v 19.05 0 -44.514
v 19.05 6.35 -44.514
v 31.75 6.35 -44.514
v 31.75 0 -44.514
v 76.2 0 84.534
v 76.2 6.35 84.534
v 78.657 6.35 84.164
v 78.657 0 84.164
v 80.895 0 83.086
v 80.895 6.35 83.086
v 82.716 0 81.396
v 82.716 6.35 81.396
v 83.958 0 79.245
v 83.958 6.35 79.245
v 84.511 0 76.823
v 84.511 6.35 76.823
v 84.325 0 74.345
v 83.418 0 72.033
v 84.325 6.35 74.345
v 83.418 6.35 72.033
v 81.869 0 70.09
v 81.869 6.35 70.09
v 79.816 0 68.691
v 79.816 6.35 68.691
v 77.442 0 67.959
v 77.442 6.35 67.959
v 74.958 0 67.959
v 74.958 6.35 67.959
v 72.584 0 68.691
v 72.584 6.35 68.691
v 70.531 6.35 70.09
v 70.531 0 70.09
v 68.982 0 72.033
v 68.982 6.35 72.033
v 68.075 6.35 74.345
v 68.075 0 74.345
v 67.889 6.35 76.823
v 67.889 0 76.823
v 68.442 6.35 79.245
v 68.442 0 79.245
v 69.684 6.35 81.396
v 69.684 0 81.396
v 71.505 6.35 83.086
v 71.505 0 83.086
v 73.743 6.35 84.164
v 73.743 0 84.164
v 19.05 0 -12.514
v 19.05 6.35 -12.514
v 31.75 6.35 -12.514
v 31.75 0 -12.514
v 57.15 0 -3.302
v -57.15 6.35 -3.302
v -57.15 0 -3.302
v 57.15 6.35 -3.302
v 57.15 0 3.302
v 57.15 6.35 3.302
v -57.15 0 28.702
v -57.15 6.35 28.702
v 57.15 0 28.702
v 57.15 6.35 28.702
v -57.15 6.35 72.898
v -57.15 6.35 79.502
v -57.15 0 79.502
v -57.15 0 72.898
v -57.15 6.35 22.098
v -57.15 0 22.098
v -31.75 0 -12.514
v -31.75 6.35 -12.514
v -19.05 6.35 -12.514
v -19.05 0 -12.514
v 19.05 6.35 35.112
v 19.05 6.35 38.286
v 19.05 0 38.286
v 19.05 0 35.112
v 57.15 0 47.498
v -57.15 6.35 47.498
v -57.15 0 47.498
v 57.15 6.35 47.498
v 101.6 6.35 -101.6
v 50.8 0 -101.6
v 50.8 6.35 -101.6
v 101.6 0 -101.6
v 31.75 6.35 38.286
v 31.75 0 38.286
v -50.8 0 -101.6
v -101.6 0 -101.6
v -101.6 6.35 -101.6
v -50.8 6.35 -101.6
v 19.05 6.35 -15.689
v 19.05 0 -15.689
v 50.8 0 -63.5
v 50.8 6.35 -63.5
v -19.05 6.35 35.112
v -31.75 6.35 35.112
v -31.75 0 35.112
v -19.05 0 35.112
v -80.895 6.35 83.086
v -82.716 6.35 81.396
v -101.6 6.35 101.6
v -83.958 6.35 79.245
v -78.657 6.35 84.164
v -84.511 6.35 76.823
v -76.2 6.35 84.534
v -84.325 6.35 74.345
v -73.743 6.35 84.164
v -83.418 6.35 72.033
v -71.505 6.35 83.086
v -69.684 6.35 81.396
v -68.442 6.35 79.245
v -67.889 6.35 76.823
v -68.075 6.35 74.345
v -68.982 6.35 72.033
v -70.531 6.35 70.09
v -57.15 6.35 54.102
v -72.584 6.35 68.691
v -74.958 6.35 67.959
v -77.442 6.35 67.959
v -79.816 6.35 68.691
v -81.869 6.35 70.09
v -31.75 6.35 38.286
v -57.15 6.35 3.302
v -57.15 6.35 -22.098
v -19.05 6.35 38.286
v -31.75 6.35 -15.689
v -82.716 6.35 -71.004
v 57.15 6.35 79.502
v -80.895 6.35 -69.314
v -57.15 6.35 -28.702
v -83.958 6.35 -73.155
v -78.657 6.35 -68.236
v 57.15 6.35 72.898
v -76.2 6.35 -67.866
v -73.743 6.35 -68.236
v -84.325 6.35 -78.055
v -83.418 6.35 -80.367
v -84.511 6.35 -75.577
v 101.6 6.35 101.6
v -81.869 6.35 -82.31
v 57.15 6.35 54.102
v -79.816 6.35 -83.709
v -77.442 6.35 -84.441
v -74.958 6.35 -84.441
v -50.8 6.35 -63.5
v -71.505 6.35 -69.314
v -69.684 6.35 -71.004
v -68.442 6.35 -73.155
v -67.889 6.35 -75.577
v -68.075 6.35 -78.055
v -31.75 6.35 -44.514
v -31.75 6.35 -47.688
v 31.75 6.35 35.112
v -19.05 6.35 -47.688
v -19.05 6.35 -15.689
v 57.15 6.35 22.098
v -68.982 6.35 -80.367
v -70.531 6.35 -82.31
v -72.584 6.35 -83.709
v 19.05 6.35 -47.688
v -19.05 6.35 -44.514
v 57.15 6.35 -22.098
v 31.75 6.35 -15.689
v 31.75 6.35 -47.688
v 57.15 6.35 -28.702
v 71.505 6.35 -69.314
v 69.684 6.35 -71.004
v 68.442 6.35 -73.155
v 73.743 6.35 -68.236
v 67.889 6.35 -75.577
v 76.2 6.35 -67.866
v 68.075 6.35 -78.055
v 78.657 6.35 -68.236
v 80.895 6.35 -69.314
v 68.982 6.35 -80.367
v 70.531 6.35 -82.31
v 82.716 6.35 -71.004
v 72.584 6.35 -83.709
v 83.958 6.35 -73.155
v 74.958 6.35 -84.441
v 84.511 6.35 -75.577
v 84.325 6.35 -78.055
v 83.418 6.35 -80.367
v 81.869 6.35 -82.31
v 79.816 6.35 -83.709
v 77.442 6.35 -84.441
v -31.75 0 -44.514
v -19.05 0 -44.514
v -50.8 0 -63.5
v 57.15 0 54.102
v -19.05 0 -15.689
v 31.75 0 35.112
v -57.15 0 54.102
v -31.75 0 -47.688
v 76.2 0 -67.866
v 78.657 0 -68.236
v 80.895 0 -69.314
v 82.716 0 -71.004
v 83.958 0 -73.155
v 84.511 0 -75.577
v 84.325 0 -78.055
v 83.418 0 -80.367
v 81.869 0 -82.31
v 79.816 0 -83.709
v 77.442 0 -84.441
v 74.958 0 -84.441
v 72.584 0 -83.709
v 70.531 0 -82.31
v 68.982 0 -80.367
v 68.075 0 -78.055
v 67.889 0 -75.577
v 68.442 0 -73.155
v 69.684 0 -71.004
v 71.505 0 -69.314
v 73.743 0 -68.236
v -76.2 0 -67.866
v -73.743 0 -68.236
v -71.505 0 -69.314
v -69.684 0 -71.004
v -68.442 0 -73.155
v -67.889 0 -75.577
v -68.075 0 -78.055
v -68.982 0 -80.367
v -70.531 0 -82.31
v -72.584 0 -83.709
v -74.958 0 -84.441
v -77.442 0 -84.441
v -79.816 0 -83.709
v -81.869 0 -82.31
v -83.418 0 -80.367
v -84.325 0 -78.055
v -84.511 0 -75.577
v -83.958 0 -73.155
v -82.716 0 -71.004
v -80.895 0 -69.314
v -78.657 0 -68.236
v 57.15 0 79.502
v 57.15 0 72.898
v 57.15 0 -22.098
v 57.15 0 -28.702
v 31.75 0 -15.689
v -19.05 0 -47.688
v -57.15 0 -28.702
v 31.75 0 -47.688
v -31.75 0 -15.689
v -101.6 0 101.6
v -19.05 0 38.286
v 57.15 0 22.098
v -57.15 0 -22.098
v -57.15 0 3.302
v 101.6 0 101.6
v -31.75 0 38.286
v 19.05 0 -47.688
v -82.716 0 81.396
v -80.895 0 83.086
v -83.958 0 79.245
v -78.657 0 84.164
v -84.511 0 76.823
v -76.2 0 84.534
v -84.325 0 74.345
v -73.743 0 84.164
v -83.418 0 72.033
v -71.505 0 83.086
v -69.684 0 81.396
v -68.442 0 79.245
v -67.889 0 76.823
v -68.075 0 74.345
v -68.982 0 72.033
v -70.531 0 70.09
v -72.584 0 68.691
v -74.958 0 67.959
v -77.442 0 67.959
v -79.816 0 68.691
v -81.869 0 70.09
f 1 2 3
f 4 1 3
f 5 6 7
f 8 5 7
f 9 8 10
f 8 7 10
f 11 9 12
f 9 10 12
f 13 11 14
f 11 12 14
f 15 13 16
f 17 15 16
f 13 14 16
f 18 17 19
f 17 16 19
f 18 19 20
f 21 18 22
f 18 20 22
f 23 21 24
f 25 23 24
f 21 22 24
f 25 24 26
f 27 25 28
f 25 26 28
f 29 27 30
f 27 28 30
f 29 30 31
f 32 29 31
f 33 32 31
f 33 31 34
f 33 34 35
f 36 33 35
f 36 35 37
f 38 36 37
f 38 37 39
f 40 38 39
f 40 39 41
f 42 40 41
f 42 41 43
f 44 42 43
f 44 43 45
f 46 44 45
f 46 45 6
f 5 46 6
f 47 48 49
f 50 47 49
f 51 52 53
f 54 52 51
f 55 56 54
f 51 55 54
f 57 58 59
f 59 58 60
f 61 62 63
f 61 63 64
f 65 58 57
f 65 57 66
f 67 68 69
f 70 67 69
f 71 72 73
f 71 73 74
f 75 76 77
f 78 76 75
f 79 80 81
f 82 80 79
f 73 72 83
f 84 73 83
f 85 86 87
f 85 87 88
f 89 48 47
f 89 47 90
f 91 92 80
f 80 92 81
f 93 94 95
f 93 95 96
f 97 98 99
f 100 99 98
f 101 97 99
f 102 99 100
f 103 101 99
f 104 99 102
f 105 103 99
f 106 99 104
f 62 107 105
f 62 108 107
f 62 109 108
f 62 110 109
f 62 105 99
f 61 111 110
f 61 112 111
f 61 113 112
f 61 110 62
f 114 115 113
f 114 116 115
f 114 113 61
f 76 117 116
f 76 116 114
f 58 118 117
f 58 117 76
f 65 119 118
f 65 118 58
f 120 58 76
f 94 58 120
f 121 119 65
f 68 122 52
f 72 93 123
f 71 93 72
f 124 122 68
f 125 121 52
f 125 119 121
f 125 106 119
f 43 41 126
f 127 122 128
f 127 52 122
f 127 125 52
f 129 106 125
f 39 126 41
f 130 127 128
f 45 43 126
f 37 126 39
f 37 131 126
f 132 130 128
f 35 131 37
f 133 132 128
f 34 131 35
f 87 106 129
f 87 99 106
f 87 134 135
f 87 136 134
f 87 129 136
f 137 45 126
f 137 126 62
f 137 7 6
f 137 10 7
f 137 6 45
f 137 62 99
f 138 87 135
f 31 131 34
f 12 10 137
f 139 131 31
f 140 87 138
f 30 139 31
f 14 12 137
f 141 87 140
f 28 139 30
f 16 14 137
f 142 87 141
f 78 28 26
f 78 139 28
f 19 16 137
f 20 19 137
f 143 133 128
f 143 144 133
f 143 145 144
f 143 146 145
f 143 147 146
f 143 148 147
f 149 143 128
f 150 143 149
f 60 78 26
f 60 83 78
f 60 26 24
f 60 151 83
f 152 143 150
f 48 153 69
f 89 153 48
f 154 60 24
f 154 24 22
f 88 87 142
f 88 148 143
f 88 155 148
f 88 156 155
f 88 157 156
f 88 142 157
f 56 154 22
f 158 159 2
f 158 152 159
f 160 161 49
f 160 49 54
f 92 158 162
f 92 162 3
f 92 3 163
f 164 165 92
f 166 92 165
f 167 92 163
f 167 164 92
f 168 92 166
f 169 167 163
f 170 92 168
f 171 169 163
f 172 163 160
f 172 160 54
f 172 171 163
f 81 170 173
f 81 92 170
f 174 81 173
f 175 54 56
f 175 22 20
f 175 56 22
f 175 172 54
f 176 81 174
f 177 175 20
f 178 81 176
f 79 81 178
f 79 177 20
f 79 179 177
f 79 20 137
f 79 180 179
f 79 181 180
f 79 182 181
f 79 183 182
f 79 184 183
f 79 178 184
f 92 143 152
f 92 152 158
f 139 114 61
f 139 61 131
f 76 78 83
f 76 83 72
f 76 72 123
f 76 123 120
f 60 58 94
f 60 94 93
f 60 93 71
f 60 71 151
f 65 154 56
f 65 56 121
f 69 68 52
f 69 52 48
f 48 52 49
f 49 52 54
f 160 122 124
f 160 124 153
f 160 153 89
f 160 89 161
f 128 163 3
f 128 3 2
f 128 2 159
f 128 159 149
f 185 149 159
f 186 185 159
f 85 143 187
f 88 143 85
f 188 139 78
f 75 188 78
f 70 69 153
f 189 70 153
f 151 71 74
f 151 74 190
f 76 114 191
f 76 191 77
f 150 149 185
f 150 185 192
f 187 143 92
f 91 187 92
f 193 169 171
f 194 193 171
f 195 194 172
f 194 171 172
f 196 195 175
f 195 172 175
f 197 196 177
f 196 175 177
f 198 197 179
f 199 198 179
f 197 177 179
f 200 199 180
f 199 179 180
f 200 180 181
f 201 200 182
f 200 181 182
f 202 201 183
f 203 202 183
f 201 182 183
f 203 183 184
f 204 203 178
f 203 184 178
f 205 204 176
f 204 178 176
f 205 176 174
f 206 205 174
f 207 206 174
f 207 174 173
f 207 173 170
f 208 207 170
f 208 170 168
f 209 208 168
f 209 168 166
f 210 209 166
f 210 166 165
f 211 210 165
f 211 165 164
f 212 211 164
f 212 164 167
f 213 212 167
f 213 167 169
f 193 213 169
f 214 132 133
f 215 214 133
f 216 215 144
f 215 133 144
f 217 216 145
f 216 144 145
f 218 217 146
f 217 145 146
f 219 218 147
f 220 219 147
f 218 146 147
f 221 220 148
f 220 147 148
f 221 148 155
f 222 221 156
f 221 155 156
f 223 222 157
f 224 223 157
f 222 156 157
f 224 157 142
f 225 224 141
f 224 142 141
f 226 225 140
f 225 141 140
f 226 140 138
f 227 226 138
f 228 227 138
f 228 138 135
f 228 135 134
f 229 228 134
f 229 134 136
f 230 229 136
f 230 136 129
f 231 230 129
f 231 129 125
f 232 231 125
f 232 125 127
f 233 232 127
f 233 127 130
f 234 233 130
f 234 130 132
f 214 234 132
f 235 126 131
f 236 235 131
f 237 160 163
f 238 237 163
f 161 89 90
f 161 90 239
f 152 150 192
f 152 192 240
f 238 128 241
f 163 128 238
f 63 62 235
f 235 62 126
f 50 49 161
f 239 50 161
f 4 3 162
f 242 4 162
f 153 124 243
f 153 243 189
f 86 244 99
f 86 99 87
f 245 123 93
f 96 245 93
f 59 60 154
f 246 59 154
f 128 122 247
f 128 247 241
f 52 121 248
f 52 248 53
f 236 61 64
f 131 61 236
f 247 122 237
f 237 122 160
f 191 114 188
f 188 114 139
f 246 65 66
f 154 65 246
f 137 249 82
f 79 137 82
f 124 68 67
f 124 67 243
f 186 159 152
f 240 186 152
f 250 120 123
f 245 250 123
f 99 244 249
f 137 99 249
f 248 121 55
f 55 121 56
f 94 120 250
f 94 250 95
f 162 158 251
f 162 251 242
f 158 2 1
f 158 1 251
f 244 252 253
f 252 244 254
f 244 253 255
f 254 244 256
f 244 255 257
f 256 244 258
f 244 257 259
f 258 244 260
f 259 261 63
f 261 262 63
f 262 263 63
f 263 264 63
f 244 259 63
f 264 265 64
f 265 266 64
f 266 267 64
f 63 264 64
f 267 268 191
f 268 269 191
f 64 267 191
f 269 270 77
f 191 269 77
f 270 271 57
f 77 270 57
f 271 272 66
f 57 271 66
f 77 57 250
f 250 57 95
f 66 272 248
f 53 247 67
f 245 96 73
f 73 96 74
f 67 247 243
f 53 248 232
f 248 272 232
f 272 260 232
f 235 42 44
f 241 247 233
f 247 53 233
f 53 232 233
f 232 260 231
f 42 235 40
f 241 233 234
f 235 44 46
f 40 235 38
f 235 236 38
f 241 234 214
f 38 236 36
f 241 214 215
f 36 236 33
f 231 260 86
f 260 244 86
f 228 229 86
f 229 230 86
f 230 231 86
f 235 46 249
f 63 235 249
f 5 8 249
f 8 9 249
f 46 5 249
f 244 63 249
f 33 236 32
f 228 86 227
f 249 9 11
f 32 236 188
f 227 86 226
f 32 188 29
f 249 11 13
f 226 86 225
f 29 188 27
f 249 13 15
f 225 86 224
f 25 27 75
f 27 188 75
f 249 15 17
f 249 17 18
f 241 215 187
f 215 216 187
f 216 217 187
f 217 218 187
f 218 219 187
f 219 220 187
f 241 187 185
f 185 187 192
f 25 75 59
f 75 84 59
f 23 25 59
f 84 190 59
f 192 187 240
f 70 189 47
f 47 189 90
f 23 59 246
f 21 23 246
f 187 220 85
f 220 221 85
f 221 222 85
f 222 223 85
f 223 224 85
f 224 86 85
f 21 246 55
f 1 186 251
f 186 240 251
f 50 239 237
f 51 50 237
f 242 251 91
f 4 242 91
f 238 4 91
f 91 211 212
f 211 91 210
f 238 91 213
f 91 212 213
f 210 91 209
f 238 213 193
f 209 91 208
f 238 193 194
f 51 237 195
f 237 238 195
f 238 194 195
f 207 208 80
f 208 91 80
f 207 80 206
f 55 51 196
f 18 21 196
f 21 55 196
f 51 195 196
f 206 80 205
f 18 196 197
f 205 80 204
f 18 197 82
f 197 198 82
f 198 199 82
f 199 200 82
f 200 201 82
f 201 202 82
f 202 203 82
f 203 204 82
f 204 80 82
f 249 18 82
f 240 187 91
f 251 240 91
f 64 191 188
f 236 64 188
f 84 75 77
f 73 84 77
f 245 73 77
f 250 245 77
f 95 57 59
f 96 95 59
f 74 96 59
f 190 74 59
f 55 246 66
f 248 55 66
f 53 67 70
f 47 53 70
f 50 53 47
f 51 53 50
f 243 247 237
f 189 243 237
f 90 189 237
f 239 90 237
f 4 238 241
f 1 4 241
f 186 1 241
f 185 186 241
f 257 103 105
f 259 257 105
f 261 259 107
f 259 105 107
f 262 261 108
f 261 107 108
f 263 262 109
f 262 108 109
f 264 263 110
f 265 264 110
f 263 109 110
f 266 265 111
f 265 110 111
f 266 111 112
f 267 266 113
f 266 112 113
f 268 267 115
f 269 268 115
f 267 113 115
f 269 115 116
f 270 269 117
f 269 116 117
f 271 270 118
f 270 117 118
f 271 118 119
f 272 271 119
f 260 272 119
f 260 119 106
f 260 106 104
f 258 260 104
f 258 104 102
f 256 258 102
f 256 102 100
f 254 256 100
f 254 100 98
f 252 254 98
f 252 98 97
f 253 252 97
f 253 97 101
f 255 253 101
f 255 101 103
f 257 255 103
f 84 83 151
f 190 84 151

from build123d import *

# Parameters (mm, degrees)
SKETCH1_W           = 203.2
SKETCH1_H           = 203.2
BOSS_EXTRUDE1_DEPTH = 6.35
SKETCH3_R           = 8.334375
SKETCH3_W           = 101.6
SKETCH3_H           = 38.1
CUT_EXTRUDE1_DEPTH  = 144.824345992
SKETCH4_W           = 114.3
SKETCH4_H           = 6.604
CUT_EXTRUDE2_DEPTH  = 144.824345992
SKETCH5_W           = 12.7
SKETCH5_H           = 3.175
CUT_EXTRUDE3_DEPTH  = 144.824345992


with BuildPart() as part:
    # Sketch1 → Boss-Extrude1 (new body)
    with BuildSketch(Plane(origin=(0, 0, 0), x_dir=(1, 0, 0), z_dir=(0, 1, 0))):
        Rectangle(SKETCH1_W, SKETCH1_H)
    extrude(amount=BOSS_EXTRUDE1_DEPTH)

    # Sketch3 → Cut-Extrude1 (cut, through all)
    with BuildSketch(Plane(origin=(0, 6.35, 0), x_dir=(1, 0, 0), z_dir=(0, 1, 0))):
        with Locations(Location((-76.2, 76.2, 0), (0, 0, 270))):
            Circle(SKETCH3_R)
        with Locations(Location((76.2, 76.2, 0), (0, 0, 270))):
            Circle(SKETCH3_R)
        with Locations(Location((-76.2, -76.2, 0), (0, 0, 270))):
            Circle(SKETCH3_R)
        with Locations(Location((76.2, -76.2, 0), (0, 0, 270))):
            Circle(SKETCH3_R)
        with Locations((0, 82.55)):
            Rectangle(SKETCH3_W, SKETCH3_H)
    extrude(amount=-CUT_EXTRUDE1_DEPTH, mode=Mode.SUBTRACT)

    # Sketch4 → Cut-Extrude2 (cut, through all)
    with BuildSketch(Plane(origin=(0, 6.35, 0), x_dir=(1, 0, 0), z_dir=(0, 1, 0))):
        with Locations((0, -50.8)):
            Rectangle(SKETCH4_W, SKETCH4_H)
        with Locations((0, 25.4)):
            Rectangle(SKETCH4_W, SKETCH4_H)
        with Locations((0, -76.2)):
            Rectangle(SKETCH4_W, SKETCH4_H)
        Rectangle(SKETCH4_W, SKETCH4_H)
        with Locations((0, -25.4)):
            Rectangle(SKETCH4_W, SKETCH4_H)
    extrude(amount=-CUT_EXTRUDE2_DEPTH, mode=Mode.SUBTRACT)

    # Sketch5 → Cut-Extrude3 (cut, through all)
    with BuildSketch(Plane(origin=(0, 6.35, 0), x_dir=(1, 0, 0), z_dir=(0, 1, 0))):
        with Locations((-25.4, 46.101)):
            Rectangle(SKETCH5_W, SKETCH5_H)
        with Locations((25.4, 46.101)):
            Rectangle(SKETCH5_W, SKETCH5_H)
        with Locations((-25.4, 14.101)):
            Rectangle(SKETCH5_W, SKETCH5_H)
        with Locations((25.4, 14.101)):
            Rectangle(SKETCH5_W, SKETCH5_H)
        with Locations((-25.4, -36.699)):
            Rectangle(SKETCH5_W, SKETCH5_H)
        with Locations((25.4, -36.699)):
            Rectangle(SKETCH5_W, SKETCH5_H)
    extrude(amount=-CUT_EXTRUDE3_DEPTH, mode=Mode.SUBTRACT)


solid = part.part
